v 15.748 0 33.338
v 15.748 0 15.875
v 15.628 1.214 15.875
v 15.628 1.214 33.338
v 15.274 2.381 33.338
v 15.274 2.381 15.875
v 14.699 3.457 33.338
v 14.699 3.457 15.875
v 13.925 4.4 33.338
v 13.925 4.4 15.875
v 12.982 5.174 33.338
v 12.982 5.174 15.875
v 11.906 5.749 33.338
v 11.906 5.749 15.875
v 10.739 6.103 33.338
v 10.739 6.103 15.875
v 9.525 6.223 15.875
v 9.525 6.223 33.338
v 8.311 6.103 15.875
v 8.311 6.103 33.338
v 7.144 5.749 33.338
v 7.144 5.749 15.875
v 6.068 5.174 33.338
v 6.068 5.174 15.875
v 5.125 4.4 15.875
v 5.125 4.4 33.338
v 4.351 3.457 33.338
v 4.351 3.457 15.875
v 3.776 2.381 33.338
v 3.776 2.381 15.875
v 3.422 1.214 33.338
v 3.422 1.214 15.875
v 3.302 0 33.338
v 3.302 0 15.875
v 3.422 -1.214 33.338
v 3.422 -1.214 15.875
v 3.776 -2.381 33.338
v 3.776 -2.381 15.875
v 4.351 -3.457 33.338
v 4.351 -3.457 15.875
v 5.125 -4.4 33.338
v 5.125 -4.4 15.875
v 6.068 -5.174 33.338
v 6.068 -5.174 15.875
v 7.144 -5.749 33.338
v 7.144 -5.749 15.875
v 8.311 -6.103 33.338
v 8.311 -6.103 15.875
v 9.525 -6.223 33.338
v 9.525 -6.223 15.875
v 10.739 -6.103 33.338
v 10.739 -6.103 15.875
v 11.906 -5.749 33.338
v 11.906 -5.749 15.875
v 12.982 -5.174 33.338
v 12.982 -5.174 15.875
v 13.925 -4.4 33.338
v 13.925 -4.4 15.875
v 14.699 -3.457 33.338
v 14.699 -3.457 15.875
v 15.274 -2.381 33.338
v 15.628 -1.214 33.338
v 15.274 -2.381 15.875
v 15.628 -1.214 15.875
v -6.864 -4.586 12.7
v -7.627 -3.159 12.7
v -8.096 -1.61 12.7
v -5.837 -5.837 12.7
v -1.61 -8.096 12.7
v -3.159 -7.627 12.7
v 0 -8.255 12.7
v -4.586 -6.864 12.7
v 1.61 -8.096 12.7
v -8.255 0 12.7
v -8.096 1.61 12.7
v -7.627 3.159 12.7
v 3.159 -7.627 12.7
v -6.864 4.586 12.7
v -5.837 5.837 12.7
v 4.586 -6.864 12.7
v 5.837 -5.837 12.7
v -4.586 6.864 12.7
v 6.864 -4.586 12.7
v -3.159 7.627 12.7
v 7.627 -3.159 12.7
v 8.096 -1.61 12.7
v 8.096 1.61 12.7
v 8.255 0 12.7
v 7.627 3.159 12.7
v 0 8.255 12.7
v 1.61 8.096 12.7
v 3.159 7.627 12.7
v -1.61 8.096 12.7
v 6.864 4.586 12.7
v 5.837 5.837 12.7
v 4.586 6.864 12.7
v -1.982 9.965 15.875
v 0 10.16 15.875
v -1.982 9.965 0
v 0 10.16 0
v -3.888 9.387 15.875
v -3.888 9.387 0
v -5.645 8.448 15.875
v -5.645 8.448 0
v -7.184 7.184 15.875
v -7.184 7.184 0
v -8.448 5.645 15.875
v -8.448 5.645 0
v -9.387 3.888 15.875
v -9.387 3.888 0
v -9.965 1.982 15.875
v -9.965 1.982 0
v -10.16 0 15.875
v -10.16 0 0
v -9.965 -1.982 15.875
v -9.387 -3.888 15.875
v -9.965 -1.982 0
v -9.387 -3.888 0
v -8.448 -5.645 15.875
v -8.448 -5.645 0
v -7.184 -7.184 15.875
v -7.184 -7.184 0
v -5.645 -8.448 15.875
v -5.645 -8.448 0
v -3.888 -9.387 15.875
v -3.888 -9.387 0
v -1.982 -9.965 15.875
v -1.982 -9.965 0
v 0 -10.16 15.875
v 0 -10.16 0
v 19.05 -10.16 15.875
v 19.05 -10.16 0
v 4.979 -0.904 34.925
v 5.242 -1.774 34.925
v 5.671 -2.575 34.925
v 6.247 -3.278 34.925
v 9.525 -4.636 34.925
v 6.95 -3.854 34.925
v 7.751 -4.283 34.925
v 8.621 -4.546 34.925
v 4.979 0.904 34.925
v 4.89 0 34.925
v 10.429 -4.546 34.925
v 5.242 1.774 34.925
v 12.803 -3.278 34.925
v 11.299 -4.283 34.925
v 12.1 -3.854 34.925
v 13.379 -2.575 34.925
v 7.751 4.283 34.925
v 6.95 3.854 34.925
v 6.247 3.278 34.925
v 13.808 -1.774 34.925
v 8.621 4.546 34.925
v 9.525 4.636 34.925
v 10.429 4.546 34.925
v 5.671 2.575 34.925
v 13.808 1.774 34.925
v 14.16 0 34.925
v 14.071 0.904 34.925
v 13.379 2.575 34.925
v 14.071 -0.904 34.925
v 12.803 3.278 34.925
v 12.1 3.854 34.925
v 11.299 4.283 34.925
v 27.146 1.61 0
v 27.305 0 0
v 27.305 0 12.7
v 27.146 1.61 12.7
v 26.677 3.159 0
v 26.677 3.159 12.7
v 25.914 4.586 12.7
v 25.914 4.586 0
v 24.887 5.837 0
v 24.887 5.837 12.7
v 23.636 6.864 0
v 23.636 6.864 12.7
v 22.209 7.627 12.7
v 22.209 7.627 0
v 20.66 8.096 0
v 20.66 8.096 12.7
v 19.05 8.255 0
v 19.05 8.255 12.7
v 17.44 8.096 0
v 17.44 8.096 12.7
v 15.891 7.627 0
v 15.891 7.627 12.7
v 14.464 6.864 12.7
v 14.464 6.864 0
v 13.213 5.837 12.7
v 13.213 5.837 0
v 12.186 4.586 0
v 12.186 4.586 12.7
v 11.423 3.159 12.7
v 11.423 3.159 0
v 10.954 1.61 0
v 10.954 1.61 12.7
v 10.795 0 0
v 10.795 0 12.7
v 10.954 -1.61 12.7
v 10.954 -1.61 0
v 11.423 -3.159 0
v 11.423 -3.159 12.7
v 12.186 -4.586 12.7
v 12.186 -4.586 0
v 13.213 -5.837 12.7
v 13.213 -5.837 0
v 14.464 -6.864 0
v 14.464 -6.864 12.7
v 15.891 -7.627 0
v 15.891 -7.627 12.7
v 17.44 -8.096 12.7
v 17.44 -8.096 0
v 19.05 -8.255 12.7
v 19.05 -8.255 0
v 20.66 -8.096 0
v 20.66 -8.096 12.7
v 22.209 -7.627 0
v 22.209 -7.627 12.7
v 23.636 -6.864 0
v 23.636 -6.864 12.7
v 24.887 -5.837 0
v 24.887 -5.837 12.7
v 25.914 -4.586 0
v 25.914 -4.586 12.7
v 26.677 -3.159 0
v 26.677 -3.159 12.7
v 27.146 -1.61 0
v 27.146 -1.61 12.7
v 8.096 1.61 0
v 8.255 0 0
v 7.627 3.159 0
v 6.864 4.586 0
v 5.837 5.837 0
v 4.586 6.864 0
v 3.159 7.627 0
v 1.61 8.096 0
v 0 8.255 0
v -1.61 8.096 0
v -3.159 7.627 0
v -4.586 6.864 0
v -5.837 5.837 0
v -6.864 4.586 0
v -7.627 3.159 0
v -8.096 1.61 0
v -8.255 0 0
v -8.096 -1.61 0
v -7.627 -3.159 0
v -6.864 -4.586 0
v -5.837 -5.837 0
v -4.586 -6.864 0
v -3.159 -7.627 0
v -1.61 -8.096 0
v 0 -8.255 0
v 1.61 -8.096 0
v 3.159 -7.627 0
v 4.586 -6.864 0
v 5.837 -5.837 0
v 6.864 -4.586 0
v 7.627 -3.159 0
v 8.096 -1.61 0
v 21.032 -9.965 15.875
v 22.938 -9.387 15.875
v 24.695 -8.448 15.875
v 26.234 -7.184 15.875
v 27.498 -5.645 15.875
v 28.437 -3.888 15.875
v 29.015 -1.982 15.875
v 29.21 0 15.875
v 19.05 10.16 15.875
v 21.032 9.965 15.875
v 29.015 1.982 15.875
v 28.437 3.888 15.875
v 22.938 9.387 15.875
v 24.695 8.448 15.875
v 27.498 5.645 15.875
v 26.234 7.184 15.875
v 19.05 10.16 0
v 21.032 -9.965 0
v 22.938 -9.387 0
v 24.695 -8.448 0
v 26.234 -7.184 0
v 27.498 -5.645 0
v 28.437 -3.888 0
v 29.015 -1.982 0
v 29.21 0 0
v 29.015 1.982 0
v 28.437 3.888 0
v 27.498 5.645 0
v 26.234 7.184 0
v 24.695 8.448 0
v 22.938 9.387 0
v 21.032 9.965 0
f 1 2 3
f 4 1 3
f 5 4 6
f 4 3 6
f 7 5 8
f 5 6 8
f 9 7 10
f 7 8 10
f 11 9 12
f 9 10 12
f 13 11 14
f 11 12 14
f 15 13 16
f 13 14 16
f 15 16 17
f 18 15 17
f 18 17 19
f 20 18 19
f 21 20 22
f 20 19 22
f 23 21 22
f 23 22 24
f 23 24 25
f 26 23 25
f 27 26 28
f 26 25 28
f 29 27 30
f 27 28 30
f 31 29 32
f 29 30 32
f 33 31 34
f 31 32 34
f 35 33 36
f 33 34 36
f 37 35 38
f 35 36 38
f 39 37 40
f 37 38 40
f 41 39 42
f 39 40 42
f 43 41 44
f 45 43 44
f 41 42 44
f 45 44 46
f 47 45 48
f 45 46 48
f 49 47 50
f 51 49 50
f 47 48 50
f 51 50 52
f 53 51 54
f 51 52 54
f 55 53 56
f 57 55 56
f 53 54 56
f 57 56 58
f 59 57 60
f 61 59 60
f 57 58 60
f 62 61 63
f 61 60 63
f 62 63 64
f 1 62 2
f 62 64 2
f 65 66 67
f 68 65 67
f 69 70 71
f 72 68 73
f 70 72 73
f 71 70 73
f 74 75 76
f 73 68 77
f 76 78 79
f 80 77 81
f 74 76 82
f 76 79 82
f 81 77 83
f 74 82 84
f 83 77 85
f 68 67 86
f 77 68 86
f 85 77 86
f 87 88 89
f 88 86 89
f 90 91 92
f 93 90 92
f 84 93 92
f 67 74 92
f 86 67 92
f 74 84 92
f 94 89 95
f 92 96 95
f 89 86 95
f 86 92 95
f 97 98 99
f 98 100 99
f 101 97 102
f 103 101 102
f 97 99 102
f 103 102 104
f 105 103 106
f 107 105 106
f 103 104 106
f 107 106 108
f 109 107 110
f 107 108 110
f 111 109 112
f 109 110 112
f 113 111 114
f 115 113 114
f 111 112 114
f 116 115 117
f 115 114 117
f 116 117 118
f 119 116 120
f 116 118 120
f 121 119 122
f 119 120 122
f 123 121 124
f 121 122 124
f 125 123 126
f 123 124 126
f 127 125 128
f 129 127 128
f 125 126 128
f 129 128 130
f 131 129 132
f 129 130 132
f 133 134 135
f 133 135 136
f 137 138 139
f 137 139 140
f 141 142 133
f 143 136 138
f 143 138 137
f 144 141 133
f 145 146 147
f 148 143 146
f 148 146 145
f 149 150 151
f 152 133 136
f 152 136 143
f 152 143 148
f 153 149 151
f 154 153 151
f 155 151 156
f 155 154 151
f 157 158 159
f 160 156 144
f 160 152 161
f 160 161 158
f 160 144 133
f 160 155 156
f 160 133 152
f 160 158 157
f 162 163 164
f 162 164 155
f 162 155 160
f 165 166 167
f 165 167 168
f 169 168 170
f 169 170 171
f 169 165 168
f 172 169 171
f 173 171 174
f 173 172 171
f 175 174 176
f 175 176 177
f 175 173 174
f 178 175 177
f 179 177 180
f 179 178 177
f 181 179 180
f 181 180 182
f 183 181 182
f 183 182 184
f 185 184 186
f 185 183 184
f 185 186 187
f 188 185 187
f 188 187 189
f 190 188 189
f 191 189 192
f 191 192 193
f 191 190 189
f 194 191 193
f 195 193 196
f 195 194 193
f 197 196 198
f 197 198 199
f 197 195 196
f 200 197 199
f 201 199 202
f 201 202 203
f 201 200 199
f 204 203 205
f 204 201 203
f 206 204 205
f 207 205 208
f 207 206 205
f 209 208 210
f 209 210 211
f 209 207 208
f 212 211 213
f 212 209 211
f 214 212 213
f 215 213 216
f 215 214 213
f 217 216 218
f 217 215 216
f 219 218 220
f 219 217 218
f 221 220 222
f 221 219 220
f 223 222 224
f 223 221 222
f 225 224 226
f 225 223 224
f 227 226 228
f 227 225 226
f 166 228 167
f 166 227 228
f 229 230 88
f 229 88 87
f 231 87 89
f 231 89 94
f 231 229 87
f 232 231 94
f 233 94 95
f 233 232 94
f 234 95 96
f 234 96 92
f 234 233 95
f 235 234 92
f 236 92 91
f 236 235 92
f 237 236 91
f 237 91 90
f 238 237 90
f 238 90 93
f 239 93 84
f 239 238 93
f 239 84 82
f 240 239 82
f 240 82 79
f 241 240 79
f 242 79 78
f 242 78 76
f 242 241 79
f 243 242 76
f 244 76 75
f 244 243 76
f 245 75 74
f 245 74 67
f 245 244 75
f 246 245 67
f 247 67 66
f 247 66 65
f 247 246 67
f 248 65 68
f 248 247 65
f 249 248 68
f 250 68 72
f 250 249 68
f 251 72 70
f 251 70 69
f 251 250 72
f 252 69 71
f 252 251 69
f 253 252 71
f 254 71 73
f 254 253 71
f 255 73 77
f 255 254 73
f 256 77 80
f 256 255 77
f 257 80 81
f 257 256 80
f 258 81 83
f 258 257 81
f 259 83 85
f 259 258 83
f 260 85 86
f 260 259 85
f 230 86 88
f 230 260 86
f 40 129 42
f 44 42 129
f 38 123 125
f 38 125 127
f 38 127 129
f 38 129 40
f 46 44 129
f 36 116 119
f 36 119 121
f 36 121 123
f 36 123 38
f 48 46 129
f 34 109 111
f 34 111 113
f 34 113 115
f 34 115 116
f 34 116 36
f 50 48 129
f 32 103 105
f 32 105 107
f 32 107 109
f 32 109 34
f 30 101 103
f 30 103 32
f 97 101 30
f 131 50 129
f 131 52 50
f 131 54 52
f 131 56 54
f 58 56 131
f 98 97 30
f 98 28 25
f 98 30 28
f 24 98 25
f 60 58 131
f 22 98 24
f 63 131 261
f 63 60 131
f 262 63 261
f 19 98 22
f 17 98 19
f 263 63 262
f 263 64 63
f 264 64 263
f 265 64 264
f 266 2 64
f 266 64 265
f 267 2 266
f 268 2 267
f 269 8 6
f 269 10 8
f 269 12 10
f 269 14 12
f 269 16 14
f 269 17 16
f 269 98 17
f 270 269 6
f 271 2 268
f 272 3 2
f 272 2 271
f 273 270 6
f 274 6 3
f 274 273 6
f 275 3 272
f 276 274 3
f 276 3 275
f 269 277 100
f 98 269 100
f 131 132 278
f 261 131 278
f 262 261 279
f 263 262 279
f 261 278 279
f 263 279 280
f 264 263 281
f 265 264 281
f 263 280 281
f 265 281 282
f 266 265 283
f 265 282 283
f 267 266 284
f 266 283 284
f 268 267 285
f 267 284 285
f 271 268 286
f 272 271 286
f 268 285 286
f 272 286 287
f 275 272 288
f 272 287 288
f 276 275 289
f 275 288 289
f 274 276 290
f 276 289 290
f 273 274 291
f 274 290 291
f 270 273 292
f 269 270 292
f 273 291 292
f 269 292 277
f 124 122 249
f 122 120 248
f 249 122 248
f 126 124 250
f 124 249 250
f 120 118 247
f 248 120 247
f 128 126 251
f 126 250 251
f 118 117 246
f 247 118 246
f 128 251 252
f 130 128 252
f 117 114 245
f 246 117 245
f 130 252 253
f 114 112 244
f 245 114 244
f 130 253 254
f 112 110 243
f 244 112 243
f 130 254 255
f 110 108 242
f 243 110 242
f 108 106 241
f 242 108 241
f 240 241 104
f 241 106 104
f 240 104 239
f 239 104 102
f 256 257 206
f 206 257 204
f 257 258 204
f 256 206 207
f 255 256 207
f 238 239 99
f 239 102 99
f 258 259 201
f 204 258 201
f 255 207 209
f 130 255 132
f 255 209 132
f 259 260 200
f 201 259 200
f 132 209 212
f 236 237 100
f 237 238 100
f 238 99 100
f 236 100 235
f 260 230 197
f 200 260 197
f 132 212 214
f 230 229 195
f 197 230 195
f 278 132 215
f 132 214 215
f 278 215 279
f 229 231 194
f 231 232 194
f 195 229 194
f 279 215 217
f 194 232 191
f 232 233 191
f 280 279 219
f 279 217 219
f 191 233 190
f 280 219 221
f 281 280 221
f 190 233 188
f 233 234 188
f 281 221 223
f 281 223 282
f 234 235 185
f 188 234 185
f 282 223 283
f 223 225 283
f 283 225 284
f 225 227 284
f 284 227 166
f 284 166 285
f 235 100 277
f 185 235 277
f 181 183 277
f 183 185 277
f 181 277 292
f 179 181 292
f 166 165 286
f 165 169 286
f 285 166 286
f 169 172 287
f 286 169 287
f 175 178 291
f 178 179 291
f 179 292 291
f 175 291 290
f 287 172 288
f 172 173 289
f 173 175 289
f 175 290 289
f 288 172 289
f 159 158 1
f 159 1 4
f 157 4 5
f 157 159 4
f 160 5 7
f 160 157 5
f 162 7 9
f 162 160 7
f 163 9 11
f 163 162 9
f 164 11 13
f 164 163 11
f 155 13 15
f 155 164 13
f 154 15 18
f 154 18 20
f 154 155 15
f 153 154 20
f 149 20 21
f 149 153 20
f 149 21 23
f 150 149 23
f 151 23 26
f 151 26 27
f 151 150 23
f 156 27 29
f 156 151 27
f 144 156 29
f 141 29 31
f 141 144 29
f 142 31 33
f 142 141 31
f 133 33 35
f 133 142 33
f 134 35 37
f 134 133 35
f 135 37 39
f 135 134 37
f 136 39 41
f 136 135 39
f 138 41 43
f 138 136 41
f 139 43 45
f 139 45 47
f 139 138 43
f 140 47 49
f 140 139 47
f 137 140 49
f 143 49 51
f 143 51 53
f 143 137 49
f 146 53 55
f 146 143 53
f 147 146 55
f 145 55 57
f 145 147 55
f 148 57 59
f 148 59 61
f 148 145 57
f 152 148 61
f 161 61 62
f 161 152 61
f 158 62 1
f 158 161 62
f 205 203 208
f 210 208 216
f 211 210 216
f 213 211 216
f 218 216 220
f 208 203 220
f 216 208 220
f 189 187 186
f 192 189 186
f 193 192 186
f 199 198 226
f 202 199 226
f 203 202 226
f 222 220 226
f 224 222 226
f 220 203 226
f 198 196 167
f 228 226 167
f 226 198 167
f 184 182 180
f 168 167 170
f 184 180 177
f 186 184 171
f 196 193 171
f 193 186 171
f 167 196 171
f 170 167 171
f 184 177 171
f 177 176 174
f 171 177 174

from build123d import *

# Parameters (mm, degrees)
F0_R     = 8.255
F1_DEPTH = 12.7
F3_DEPTH = 3.175
F4_R     = 6.223
F5_DEPTH = 19.05
F6_SIZE  = 1.5875


with BuildPart() as f1:
    # F0 (on Top) → F1 (new body)
    with BuildSketch(Plane.XY):
        with BuildLine():
            Line((19.05, 10.16), (0, 10.16))
            ThreePointArc((0, 10.16), (-10.16, 0), (0, -10.16))
            Line((0, -10.16), (19.05, -10.16))
            ThreePointArc((19.05, -10.16), (29.21, 0), (19.05, 10.16))
        make_face()
        Circle(F0_R, mode=Mode.SUBTRACT)
        with Locations((19.05, 0)):
            Circle(F0_R, mode=Mode.SUBTRACT)
    extrude(amount=F1_DEPTH)

    # F2 (on face) → F3 (join)
    with BuildSketch(Plane.XY.offset(12.7)):
        with BuildLine():
            Line((19.05, 10.16), (0, 10.16))
            ThreePointArc((0, 10.16), (-10.16, 0), (0, -10.16))
            Line((0, -10.16), (19.05, -10.16))
            ThreePointArc((19.05, -10.16), (29.21, 0), (19.05, 10.16))
        make_face()
    extrude(amount=F3_DEPTH)

    # F4 (on face) → F5 (join)
    with BuildSketch(Plane.XY.offset(15.875)):
        with Locations((9.525, 0)):
            Circle(F4_R)
    extrude(amount=F5_DEPTH)

    # F6
    f6_edges = [f1.edges().sort_by_distance(p)[0] for p in [
        (3.302, 0, 34.925),
    ]]
    chamfer(f6_edges, length=F6_SIZE)


solid = f1.part
